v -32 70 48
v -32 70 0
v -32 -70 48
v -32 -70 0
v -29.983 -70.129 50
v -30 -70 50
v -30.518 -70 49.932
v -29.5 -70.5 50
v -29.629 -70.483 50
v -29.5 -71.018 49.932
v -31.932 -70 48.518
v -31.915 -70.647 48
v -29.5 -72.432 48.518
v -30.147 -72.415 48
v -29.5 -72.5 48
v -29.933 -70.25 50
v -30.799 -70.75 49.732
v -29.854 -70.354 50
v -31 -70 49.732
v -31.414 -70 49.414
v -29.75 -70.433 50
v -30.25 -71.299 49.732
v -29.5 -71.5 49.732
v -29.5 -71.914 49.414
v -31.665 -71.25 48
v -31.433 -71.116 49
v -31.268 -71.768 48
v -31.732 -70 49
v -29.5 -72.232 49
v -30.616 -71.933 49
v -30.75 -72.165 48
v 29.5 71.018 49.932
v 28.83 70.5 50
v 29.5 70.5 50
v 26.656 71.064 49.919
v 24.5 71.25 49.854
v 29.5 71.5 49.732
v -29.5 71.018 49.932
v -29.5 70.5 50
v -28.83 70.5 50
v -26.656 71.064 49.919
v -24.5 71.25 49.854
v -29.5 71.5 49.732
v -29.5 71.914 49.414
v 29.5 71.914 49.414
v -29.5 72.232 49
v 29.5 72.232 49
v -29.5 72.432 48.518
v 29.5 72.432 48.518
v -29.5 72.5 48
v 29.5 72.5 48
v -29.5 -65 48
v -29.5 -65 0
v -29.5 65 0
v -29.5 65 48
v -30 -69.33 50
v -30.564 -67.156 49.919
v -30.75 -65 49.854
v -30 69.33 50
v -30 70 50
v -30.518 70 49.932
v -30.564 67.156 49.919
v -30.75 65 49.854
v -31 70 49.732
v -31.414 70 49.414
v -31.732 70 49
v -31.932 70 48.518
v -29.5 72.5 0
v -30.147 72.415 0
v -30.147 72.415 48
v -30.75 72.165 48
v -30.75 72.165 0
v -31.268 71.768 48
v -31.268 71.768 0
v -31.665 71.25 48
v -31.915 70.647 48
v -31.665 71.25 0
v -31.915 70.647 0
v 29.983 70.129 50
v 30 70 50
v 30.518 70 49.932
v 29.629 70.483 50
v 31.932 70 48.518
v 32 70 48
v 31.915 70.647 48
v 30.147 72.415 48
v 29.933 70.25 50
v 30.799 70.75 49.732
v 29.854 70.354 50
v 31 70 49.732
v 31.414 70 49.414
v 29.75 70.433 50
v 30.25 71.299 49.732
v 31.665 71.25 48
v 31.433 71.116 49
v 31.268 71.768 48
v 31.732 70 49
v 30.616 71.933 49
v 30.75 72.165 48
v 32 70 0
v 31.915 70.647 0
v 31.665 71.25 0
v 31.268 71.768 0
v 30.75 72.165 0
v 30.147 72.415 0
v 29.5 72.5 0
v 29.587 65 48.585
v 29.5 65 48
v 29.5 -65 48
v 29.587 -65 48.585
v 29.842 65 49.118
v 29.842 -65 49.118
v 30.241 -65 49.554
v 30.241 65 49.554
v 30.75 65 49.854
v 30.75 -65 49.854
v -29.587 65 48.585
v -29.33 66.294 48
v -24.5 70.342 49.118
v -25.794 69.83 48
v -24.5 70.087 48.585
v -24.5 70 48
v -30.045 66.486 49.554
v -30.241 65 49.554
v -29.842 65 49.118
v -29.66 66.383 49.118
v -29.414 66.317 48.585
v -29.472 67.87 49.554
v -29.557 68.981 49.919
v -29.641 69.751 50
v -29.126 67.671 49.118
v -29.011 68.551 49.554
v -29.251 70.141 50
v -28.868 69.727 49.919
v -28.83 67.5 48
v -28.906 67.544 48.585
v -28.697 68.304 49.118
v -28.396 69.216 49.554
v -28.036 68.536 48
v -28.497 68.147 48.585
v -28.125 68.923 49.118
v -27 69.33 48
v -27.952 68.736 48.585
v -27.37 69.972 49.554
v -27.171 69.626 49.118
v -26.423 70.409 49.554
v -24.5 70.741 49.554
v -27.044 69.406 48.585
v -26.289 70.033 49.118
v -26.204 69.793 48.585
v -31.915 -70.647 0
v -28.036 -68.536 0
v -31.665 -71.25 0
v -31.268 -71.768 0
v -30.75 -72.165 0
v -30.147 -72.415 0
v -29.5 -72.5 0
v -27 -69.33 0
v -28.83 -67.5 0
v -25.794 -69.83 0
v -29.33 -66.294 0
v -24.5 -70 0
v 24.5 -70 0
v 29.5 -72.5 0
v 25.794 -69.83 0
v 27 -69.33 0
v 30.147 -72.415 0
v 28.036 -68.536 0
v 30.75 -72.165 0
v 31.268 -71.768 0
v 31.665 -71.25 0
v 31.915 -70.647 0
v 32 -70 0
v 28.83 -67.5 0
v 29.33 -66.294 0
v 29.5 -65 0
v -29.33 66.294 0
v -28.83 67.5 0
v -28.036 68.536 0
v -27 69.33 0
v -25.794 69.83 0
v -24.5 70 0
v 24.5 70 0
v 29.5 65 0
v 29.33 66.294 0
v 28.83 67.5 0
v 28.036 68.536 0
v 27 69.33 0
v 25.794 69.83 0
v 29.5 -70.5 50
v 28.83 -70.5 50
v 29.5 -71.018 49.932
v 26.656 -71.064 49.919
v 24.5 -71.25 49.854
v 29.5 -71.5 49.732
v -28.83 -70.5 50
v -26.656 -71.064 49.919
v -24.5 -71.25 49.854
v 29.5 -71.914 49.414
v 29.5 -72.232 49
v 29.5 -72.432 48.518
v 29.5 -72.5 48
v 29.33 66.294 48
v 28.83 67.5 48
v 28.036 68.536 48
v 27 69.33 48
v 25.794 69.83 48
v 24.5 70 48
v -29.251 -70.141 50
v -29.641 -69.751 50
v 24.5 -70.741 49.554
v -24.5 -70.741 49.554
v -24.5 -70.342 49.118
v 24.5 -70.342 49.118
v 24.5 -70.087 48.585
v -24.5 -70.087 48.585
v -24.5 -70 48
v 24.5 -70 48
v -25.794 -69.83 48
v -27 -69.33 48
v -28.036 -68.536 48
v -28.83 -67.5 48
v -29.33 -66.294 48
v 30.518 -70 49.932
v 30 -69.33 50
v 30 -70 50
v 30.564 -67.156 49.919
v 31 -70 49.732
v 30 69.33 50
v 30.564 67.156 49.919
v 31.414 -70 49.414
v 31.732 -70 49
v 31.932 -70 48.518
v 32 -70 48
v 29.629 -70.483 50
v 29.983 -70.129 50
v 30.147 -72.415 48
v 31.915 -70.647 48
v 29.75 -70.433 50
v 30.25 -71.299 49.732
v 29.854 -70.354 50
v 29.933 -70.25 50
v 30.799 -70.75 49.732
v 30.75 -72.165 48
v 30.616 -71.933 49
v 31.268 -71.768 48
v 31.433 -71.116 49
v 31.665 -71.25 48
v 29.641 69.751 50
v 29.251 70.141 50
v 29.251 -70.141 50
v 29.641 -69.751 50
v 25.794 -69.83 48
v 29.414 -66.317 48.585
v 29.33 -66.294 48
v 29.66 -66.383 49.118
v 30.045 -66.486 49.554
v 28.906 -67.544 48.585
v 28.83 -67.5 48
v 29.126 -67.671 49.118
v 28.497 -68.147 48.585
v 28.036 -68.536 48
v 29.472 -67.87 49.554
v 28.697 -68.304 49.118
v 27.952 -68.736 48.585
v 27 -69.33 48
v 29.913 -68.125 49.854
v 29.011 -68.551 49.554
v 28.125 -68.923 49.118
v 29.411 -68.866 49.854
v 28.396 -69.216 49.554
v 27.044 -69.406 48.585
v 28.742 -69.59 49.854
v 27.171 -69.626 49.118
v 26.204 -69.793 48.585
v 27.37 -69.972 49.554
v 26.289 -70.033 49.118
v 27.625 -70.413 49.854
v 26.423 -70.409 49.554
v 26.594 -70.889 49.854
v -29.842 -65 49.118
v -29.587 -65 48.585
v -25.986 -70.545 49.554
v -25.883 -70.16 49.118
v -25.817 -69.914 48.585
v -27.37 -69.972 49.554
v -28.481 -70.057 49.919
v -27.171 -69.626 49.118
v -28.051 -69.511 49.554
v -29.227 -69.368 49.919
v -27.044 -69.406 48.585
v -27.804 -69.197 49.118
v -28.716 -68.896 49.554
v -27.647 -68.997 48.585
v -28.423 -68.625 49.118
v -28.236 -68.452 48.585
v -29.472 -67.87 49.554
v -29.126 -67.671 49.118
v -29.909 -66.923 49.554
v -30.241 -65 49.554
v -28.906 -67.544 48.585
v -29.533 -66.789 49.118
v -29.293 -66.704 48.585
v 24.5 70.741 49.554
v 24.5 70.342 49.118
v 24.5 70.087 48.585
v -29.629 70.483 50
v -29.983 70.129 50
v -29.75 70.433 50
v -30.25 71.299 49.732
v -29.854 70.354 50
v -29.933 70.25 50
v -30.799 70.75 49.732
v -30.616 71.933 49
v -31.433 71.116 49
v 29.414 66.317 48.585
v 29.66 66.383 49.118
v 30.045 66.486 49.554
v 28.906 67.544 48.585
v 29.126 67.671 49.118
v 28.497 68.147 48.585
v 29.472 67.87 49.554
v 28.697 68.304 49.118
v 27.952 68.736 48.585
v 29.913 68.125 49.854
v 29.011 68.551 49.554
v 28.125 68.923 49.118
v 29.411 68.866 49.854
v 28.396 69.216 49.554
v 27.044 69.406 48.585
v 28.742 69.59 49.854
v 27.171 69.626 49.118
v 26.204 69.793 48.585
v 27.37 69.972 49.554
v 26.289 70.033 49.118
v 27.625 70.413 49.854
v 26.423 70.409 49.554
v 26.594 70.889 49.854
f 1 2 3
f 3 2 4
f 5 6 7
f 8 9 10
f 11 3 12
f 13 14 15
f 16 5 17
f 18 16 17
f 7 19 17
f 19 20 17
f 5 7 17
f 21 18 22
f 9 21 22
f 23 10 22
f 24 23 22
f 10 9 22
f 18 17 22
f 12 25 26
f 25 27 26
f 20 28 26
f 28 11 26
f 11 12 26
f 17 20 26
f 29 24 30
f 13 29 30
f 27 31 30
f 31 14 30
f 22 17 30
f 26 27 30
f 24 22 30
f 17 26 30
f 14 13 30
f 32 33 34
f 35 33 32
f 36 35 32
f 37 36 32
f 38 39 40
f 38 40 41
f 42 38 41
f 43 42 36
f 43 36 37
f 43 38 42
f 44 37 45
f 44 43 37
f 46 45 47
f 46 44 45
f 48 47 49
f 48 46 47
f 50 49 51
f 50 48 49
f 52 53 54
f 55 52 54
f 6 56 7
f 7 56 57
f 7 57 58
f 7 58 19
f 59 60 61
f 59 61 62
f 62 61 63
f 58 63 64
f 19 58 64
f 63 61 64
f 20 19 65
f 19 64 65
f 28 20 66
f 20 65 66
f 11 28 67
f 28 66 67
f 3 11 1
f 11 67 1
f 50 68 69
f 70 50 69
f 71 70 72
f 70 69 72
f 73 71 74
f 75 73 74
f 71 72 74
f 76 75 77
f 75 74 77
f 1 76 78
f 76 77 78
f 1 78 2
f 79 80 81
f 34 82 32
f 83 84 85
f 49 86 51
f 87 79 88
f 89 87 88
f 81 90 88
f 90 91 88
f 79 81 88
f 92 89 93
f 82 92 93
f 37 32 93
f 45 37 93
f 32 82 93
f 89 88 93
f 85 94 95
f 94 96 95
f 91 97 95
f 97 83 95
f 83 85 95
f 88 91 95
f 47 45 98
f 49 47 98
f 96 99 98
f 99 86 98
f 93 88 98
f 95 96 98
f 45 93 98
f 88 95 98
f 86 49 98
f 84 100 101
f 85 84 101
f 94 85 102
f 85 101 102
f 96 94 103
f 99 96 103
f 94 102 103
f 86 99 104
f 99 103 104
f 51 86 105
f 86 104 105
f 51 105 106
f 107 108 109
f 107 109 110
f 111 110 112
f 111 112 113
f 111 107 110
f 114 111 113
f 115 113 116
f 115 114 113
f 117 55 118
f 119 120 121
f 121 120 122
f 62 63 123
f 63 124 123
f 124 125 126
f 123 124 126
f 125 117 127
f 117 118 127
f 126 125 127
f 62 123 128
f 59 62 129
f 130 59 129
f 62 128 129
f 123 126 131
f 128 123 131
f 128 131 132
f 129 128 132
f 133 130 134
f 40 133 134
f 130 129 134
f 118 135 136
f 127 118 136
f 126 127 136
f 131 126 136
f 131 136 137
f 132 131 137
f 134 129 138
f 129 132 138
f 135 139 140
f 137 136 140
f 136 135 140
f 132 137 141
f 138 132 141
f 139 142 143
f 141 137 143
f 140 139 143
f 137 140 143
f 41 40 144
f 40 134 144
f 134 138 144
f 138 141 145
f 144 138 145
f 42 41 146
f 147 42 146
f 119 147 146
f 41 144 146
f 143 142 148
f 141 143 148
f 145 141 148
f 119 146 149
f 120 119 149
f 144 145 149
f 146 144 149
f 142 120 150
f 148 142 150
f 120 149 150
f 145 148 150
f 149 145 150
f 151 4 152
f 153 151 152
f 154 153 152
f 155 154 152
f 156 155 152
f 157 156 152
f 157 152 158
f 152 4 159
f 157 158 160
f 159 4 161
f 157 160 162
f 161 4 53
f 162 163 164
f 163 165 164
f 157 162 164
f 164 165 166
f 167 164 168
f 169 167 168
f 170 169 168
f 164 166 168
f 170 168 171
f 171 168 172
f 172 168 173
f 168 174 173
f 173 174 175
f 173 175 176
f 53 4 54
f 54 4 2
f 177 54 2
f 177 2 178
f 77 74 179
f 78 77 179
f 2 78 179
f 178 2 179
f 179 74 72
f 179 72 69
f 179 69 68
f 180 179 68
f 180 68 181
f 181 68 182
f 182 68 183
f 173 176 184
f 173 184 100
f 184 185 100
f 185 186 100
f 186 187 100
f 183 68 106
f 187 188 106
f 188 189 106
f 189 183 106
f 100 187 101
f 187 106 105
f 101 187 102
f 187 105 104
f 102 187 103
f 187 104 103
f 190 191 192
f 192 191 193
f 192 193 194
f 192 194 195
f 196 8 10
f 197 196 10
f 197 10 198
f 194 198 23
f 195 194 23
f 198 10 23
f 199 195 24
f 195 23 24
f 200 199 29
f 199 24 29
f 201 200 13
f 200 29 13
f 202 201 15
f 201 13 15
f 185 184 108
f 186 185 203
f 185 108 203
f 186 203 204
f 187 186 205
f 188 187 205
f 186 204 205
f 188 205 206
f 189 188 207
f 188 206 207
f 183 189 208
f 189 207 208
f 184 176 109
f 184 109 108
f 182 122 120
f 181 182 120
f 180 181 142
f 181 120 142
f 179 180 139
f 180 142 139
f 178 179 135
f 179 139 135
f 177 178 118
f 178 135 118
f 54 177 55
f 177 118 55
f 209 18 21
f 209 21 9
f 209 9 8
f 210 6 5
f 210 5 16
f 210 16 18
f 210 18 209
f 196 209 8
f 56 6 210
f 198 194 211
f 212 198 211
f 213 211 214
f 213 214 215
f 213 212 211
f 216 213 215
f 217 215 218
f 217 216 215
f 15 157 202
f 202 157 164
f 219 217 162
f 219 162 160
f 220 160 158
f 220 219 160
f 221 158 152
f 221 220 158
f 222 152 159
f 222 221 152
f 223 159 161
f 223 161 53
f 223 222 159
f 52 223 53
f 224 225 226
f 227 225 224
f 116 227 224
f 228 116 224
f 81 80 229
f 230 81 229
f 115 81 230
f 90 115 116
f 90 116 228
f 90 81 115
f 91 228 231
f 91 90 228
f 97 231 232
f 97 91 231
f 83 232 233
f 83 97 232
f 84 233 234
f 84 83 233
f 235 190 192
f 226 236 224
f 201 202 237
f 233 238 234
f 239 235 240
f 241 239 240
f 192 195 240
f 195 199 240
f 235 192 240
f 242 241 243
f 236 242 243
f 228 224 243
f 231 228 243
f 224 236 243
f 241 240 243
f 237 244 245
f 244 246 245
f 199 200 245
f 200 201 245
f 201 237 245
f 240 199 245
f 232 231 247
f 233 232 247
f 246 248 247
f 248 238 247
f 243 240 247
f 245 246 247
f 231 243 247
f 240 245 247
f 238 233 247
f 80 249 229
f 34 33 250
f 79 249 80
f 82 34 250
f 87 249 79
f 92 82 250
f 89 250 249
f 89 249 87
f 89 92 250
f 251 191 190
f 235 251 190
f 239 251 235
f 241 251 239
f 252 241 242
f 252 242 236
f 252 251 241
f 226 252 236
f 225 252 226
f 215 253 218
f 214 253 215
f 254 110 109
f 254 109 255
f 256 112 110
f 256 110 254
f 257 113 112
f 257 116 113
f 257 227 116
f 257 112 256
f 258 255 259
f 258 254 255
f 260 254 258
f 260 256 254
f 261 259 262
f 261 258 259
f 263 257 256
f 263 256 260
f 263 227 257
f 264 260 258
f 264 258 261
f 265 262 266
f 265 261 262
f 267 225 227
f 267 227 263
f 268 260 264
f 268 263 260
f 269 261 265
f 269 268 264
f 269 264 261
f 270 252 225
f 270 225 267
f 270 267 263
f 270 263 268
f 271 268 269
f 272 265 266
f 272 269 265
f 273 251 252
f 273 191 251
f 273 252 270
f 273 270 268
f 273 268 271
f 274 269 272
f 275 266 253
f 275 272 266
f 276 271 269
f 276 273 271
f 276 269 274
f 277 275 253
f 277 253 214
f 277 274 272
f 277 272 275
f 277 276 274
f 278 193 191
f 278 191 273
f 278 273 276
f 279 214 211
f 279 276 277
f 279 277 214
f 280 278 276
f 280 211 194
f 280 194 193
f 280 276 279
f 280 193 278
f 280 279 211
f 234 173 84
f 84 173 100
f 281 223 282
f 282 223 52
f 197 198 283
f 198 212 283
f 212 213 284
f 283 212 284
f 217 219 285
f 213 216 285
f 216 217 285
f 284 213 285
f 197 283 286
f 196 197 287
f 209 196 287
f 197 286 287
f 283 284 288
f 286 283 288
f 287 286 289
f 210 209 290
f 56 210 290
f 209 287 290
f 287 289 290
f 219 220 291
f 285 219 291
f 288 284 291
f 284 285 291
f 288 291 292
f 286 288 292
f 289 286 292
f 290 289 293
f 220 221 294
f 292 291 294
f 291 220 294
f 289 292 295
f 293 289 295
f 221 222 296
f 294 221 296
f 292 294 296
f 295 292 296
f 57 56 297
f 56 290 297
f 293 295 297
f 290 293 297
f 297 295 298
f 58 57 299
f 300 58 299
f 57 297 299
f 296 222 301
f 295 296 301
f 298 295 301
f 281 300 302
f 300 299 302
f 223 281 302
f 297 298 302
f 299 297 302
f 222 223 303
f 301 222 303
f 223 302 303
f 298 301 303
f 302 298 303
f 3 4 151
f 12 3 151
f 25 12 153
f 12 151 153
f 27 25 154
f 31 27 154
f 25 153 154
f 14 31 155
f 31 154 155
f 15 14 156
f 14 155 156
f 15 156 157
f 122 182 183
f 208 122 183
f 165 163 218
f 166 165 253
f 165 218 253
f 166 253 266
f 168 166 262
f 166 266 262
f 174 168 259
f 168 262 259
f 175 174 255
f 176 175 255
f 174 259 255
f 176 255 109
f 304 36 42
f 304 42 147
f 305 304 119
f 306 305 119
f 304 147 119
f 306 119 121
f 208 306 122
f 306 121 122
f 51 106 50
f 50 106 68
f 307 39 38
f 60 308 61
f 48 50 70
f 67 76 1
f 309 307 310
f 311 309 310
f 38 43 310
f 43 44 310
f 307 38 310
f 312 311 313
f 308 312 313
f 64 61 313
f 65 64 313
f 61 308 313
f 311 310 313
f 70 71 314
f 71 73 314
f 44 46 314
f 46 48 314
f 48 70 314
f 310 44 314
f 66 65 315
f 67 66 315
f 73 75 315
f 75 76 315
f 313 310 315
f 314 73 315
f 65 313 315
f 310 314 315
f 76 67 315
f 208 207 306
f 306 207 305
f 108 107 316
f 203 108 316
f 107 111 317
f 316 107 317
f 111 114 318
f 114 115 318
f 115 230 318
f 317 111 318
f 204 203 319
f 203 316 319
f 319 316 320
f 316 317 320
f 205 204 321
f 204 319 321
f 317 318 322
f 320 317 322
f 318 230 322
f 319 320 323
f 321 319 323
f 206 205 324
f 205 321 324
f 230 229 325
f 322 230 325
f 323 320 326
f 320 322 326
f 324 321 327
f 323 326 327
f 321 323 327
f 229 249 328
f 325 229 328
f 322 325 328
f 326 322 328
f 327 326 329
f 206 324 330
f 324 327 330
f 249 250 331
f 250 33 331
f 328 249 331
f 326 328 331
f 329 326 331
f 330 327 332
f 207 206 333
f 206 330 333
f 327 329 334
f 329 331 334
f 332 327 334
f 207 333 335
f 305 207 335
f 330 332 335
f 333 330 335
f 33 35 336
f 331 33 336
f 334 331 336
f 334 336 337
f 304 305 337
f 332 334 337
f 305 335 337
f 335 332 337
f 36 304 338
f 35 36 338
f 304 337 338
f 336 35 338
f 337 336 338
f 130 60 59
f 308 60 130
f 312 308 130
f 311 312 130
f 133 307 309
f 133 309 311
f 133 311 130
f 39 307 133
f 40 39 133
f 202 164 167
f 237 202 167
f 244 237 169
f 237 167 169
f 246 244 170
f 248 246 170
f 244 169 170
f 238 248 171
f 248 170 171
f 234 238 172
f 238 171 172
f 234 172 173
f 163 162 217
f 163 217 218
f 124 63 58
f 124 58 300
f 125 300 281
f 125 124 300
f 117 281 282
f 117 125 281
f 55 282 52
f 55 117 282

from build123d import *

# Parameters (mm, degrees)
F0_W         = 59
F0_H         = 140
F1_DEPTH     = 50
F2_R         = 5
F3_T1_DEPTH  = 130
F3_T3_DEPTH  = 49
F3_T5_DEPTH  = 59
F3_T7_DEPTH  = 140
F3_T10_ANGLE = 90
F3_T12_ANGLE = 90
F3_T14_ANGLE = 90
F3_T16_ANGLE = 90
F3_T18_ANGLE = 90
F3_T20_ANGLE = 90
F3_T22_ANGLE = 90
F3_T24_ANGLE = 90


# Not quite as in the source:
# - a fillet or chamfer that OpenCascade refuses, or shapes differently, is made with other operations: its cross-section is extruded or revolved along the edge and cut away or added


with BuildPart() as f1:
    # F0 (on Top) → F1 (new body)
    with BuildSketch(Plane.XY):
        with BuildLine():
            Line((-29.5, -72.5), (29.5, -72.5))
            ThreePointArc((29.5, -72.5), (31.267766953, -71.767766953), (32, -70))
            Line((32, -70), (32, 70))
            ThreePointArc((32, 70), (31.267766953, 71.767766953), (29.5, 72.5))
            Line((29.5, 72.5), (-29.5, 72.5))
            ThreePointArc((-29.5, 72.5), (-31.267766953, 71.767766953), (-32, 70))
            Line((-32, 70), (-32, -70))
            ThreePointArc((-32, -70), (-31.267766953, -71.767766953), (-29.5, -72.5))
        make_face()
        Rectangle(F0_W, F0_H, mode=Mode.SUBTRACT)
    extrude(amount=F1_DEPTH)

    # F2
    f2_edges = [f1.edges().sort_by_distance(p)[0] for p in [
        (-29.5, 70, 25),
        (29.5, 70, 25),
        (-29.5, -70, 25),
        (29.5, -70, 25),
    ]]
    fillet(f2_edges, radius=F2_R)

    # F3: fillet of radius 2 on 16 edges, made by hand

    # F3_s2 → F3_t1 (cut)
    with BuildSketch(Plane.XZ.offset(-65)):
        with BuildLine():
            ThreePointArc((29.5, 48), (30.0857864376, 49.4142135624), (31.5, 50))
            Line((31.5, 50), (29.5, 50))
            Line((29.5, 50), (29.5, 48))
        make_face()
        with BuildLine():
            ThreePointArc((-31.5, 50), (-30.0857864376, 49.4142135624), (-29.5, 48))
            Line((-29.5, 48), (-29.5, 50))
            Line((-29.5, 50), (-31.5, 50))
        make_face()
    extrude(amount=F3_T1_DEPTH, mode=Mode.SUBTRACT)

    # F3_s4 → F3_t3 (cut)
    with BuildSketch(Plane.YZ.offset(-24.5)):
        with BuildLine():
            ThreePointArc((72, 50), (70.5857864376, 49.4142135624), (70, 48))
            Line((70, 48), (70, 50))
            Line((70, 50), (72, 50))
        make_face()
        with BuildLine():
            ThreePointArc((-72, 50), (-70.5857864376, 49.4142135624), (-70, 48))
            Line((-70, 48), (-70, 50))
            Line((-70, 50), (-72, 50))
        make_face()
    extrude(amount=F3_T3_DEPTH, mode=Mode.SUBTRACT)

    # F3_s6 → F3_t5 (cut)
    with BuildSketch(Plane.YZ.offset(-29.5)):
        with BuildLine():
            ThreePointArc((-70.5, 50), (-71.9142135624, 49.4142135624), (-72.5, 48))
            Line((-72.5, 48), (-72.5, 50))
            Line((-72.5, 50), (-70.5, 50))
        make_face()
        with BuildLine():
            ThreePointArc((70.5, 50), (71.9142135624, 49.4142135624), (72.5, 48))
            Line((72.5, 48), (72.5, 50))
            Line((72.5, 50), (70.5, 50))
        make_face()
    extrude(amount=F3_T5_DEPTH, mode=Mode.SUBTRACT)

    # F3_s8 → F3_t7 (cut)
    with BuildSketch(Plane.XZ.offset(-70)):
        with BuildLine():
            ThreePointArc((30, 50), (31.4142135624, 49.4142135624), (32, 48))
            Line((32, 48), (32, 50))
            Line((32, 50), (30, 50))
        make_face()
        with BuildLine():
            ThreePointArc((-30, 50), (-31.4142135624, 49.4142135624), (-32, 48))
            Line((-32, 48), (-32, 50))
            Line((-32, 50), (-30, 50))
        make_face()
    extrude(amount=F3_T7_DEPTH, mode=Mode.SUBTRACT)

    # F3_s9 → F3_t10 (revolve, cut)
    with BuildSketch(Plane.XZ.offset(-65)):
        with BuildLine():
            ThreePointArc((29.5, 48), (30.0857864376, 49.4142135624), (31.5, 50))
            Line((31.5, 50), (29.5, 50))
            Line((29.5, 50), (29.5, 48))
        make_face()
    revolve(axis=Axis((24.5, 65, 50), (0, 0, 1)), revolution_arc=F3_T10_ANGLE, mode=Mode.SUBTRACT)

    # F3_s11 → F3_t12 (revolve, cut)
    with BuildSketch(Plane.XZ.offset(65)):
        with BuildLine():
            ThreePointArc((29.5, 48), (30.0857864376, 49.4142135624), (31.5, 50))
            Line((31.5, 50), (29.5, 50))
            Line((29.5, 50), (29.5, 48))
        make_face()
    revolve(axis=Axis((24.5, -65, 50), (0, 0, -1)), revolution_arc=F3_T12_ANGLE, mode=Mode.SUBTRACT)

    # F3_s13 → F3_t14 (revolve, cut)
    with BuildSketch(Plane.XZ.offset(-65)):
        with BuildLine():
            ThreePointArc((-31.5, 50), (-30.0857864376, 49.4142135624), (-29.5, 48))
            Line((-29.5, 48), (-29.5, 50))
            Line((-29.5, 50), (-31.5, 50))
        make_face()
    revolve(axis=Axis((-24.5, 65, 50), (0, 0, -1)), revolution_arc=F3_T14_ANGLE, mode=Mode.SUBTRACT)

    # F3_s15 → F3_t16 (revolve, cut)
    with BuildSketch(Plane.YZ.offset(-24.5)):
        with BuildLine():
            ThreePointArc((-72, 50), (-70.5857864376, 49.4142135624), (-70, 48))
            Line((-70, 48), (-70, 50))
            Line((-70, 50), (-72, 50))
        make_face()
    revolve(axis=Axis((-24.5, -65, 50), (0, 0, -1)), revolution_arc=F3_T16_ANGLE, mode=Mode.SUBTRACT)

    # F3_s17 → F3_t18 (revolve, cut)
    with BuildSketch(Plane.XZ.offset(70)):
        with BuildLine():
            ThreePointArc((-30, 50), (-31.4142135624, 49.4142135624), (-32, 48))
            Line((-32, 48), (-32, 50))
            Line((-32, 50), (-30, 50))
        make_face()
    revolve(axis=Axis((-29.5, -70, 50), (0, 0, 1)), revolution_arc=F3_T18_ANGLE, mode=Mode.SUBTRACT)

    # F3_s19 → F3_t20 (revolve, cut)
    with BuildSketch(Plane.YZ.offset(29.5)):
        with BuildLine():
            ThreePointArc((-70.5, 50), (-71.9142135624, 49.4142135624), (-72.5, 48))
            Line((-72.5, 48), (-72.5, 50))
            Line((-72.5, 50), (-70.5, 50))
        make_face()
    revolve(axis=Axis((29.5, -70, 50), (0, 0, 1)), revolution_arc=F3_T20_ANGLE, mode=Mode.SUBTRACT)

    # F3_s21 → F3_t22 (revolve, cut)
    with BuildSketch(Plane.XZ.offset(-70)):
        with BuildLine():
            ThreePointArc((30, 50), (31.4142135624, 49.4142135624), (32, 48))
            Line((32, 48), (32, 50))
            Line((32, 50), (30, 50))
        make_face()
    revolve(axis=Axis((29.5, 70, 50), (0, 0, 1)), revolution_arc=F3_T22_ANGLE, mode=Mode.SUBTRACT)

    # F3_s23 → F3_t24 (revolve, cut)
    with BuildSketch(Plane.YZ.offset(-29.5)):
        with BuildLine():
            ThreePointArc((70.5, 50), (71.9142135624, 49.4142135624), (72.5, 48))
            Line((72.5, 48), (72.5, 50))
            Line((72.5, 50), (70.5, 50))
        make_face()
    revolve(axis=Axis((-29.5, 70, 50), (0, 0, 1)), revolution_arc=F3_T24_ANGLE, mode=Mode.SUBTRACT)


solid = f1.part
